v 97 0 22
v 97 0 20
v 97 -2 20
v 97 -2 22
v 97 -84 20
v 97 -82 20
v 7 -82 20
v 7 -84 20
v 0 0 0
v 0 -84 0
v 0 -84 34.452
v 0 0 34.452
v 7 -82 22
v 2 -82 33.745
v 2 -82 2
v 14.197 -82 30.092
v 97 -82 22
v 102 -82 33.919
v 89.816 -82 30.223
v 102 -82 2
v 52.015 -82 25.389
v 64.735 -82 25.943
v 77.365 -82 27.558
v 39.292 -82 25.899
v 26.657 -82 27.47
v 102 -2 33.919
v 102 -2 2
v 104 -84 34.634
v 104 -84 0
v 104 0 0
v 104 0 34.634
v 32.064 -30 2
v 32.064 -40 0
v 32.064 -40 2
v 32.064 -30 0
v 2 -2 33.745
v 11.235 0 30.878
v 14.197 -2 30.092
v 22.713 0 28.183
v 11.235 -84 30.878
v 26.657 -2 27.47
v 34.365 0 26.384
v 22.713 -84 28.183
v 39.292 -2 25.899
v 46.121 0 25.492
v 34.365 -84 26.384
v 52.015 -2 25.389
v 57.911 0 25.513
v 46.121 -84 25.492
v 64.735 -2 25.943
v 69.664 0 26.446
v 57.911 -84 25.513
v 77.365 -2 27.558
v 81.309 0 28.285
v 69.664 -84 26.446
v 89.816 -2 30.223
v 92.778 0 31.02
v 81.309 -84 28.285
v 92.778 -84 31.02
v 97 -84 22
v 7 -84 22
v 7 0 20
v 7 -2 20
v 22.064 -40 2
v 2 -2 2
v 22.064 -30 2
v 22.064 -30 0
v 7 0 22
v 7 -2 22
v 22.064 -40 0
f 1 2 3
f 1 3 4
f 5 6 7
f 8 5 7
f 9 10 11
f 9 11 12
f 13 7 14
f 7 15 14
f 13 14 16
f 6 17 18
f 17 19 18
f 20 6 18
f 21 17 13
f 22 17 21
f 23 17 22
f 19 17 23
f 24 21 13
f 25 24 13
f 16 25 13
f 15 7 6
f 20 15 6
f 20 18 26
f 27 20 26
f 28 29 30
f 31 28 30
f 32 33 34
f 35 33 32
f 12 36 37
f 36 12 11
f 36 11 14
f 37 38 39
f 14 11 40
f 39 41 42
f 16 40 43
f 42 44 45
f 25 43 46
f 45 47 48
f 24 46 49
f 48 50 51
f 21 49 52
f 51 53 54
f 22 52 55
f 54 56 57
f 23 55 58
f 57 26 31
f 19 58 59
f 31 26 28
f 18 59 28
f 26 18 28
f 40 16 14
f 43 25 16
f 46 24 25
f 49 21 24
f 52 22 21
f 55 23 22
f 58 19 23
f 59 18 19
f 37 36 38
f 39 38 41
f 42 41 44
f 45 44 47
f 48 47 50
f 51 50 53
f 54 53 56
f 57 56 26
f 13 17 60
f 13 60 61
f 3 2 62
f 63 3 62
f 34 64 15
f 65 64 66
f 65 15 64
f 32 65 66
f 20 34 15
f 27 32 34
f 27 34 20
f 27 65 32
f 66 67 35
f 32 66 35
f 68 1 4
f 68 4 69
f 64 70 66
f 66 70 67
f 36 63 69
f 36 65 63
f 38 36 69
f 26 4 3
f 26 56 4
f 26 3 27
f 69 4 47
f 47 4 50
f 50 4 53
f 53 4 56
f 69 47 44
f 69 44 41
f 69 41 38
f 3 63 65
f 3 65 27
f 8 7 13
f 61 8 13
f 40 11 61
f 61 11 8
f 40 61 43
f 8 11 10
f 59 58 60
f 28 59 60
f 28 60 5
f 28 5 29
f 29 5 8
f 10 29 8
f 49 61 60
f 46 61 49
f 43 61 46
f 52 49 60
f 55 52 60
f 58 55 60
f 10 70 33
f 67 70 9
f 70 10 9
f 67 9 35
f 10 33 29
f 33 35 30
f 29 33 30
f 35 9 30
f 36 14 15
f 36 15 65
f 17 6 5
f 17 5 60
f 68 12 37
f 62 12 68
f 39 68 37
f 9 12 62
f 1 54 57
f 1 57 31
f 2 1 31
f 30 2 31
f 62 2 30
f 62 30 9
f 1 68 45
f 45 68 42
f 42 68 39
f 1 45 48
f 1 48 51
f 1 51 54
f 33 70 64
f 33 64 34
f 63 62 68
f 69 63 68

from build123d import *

# Parameters (mm, degrees)
SKETCH006_W     = 104
SKETCH006_H     = 84
SKETCH006_W_2   = 10
SKETCH006_H_2   = 10
PAD002_DEPTH    = 36
SKETCH007_W     = 100
SKETCH007_H     = 80
POCKET004_DEPTH = 34
POCKET005_DEPTH = 84.001
SKETCH009_W     = 90
SKETCH009_H     = 2
POCKET006_DEPTH = 84.001


with BuildPart() as part:
    # Sketch006 (on XY_Plane003 of Origin006) → Pad002 (new body)
    with BuildSketch(Plane.XY):
        with Locations((52, -42)):
            Rectangle(SKETCH006_W, SKETCH006_H)
        with Locations((27.064243, -35)):
            Rectangle(SKETCH006_W_2, SKETCH006_H_2, mode=Mode.SUBTRACT)
    extrude(amount=PAD002_DEPTH)

    # Sketch007 (on Face10 of Pad002) → Pocket004 (cut)
    with BuildSketch(Plane.XY.offset(36)):
        with Locations((52, -42)):
            Rectangle(SKETCH007_W, SKETCH007_H)
    extrude(amount=-POCKET004_DEPTH, mode=Mode.SUBTRACT)

    # Sketch008 (on Face3 of Pocket004) → Pocket005 (cut, through all)
    with BuildSketch(Plane.XZ.offset(84)):
        with BuildLine():
            ThreePointArc((-2.31593, 35.310703), (51.750534, 25.388306), (105.816997, 35.310703))
            Line((105.816997, 35.310703), (106.775558, 49.576915))
            Line((-2.31593, 49.576915), (106.775558, 49.576915))
            Line((-2.31593, 35.310703), (-2.31593, 49.576915))
        make_face()
    extrude(amount=-POCKET005_DEPTH, mode=Mode.SUBTRACT)

    # Sketch009 (on Face5 of Pocket005) → Pocket006 (cut, through all)
    with BuildSketch(Plane(origin=(0, 0, 0), x_dir=(-1, 0, 0), z_dir=(0, 1, 0))):
        with Locations((-52, 21)):
            Rectangle(SKETCH009_W, SKETCH009_H)
    extrude(amount=-POCKET006_DEPTH, mode=Mode.SUBTRACT)


solid = part.part
